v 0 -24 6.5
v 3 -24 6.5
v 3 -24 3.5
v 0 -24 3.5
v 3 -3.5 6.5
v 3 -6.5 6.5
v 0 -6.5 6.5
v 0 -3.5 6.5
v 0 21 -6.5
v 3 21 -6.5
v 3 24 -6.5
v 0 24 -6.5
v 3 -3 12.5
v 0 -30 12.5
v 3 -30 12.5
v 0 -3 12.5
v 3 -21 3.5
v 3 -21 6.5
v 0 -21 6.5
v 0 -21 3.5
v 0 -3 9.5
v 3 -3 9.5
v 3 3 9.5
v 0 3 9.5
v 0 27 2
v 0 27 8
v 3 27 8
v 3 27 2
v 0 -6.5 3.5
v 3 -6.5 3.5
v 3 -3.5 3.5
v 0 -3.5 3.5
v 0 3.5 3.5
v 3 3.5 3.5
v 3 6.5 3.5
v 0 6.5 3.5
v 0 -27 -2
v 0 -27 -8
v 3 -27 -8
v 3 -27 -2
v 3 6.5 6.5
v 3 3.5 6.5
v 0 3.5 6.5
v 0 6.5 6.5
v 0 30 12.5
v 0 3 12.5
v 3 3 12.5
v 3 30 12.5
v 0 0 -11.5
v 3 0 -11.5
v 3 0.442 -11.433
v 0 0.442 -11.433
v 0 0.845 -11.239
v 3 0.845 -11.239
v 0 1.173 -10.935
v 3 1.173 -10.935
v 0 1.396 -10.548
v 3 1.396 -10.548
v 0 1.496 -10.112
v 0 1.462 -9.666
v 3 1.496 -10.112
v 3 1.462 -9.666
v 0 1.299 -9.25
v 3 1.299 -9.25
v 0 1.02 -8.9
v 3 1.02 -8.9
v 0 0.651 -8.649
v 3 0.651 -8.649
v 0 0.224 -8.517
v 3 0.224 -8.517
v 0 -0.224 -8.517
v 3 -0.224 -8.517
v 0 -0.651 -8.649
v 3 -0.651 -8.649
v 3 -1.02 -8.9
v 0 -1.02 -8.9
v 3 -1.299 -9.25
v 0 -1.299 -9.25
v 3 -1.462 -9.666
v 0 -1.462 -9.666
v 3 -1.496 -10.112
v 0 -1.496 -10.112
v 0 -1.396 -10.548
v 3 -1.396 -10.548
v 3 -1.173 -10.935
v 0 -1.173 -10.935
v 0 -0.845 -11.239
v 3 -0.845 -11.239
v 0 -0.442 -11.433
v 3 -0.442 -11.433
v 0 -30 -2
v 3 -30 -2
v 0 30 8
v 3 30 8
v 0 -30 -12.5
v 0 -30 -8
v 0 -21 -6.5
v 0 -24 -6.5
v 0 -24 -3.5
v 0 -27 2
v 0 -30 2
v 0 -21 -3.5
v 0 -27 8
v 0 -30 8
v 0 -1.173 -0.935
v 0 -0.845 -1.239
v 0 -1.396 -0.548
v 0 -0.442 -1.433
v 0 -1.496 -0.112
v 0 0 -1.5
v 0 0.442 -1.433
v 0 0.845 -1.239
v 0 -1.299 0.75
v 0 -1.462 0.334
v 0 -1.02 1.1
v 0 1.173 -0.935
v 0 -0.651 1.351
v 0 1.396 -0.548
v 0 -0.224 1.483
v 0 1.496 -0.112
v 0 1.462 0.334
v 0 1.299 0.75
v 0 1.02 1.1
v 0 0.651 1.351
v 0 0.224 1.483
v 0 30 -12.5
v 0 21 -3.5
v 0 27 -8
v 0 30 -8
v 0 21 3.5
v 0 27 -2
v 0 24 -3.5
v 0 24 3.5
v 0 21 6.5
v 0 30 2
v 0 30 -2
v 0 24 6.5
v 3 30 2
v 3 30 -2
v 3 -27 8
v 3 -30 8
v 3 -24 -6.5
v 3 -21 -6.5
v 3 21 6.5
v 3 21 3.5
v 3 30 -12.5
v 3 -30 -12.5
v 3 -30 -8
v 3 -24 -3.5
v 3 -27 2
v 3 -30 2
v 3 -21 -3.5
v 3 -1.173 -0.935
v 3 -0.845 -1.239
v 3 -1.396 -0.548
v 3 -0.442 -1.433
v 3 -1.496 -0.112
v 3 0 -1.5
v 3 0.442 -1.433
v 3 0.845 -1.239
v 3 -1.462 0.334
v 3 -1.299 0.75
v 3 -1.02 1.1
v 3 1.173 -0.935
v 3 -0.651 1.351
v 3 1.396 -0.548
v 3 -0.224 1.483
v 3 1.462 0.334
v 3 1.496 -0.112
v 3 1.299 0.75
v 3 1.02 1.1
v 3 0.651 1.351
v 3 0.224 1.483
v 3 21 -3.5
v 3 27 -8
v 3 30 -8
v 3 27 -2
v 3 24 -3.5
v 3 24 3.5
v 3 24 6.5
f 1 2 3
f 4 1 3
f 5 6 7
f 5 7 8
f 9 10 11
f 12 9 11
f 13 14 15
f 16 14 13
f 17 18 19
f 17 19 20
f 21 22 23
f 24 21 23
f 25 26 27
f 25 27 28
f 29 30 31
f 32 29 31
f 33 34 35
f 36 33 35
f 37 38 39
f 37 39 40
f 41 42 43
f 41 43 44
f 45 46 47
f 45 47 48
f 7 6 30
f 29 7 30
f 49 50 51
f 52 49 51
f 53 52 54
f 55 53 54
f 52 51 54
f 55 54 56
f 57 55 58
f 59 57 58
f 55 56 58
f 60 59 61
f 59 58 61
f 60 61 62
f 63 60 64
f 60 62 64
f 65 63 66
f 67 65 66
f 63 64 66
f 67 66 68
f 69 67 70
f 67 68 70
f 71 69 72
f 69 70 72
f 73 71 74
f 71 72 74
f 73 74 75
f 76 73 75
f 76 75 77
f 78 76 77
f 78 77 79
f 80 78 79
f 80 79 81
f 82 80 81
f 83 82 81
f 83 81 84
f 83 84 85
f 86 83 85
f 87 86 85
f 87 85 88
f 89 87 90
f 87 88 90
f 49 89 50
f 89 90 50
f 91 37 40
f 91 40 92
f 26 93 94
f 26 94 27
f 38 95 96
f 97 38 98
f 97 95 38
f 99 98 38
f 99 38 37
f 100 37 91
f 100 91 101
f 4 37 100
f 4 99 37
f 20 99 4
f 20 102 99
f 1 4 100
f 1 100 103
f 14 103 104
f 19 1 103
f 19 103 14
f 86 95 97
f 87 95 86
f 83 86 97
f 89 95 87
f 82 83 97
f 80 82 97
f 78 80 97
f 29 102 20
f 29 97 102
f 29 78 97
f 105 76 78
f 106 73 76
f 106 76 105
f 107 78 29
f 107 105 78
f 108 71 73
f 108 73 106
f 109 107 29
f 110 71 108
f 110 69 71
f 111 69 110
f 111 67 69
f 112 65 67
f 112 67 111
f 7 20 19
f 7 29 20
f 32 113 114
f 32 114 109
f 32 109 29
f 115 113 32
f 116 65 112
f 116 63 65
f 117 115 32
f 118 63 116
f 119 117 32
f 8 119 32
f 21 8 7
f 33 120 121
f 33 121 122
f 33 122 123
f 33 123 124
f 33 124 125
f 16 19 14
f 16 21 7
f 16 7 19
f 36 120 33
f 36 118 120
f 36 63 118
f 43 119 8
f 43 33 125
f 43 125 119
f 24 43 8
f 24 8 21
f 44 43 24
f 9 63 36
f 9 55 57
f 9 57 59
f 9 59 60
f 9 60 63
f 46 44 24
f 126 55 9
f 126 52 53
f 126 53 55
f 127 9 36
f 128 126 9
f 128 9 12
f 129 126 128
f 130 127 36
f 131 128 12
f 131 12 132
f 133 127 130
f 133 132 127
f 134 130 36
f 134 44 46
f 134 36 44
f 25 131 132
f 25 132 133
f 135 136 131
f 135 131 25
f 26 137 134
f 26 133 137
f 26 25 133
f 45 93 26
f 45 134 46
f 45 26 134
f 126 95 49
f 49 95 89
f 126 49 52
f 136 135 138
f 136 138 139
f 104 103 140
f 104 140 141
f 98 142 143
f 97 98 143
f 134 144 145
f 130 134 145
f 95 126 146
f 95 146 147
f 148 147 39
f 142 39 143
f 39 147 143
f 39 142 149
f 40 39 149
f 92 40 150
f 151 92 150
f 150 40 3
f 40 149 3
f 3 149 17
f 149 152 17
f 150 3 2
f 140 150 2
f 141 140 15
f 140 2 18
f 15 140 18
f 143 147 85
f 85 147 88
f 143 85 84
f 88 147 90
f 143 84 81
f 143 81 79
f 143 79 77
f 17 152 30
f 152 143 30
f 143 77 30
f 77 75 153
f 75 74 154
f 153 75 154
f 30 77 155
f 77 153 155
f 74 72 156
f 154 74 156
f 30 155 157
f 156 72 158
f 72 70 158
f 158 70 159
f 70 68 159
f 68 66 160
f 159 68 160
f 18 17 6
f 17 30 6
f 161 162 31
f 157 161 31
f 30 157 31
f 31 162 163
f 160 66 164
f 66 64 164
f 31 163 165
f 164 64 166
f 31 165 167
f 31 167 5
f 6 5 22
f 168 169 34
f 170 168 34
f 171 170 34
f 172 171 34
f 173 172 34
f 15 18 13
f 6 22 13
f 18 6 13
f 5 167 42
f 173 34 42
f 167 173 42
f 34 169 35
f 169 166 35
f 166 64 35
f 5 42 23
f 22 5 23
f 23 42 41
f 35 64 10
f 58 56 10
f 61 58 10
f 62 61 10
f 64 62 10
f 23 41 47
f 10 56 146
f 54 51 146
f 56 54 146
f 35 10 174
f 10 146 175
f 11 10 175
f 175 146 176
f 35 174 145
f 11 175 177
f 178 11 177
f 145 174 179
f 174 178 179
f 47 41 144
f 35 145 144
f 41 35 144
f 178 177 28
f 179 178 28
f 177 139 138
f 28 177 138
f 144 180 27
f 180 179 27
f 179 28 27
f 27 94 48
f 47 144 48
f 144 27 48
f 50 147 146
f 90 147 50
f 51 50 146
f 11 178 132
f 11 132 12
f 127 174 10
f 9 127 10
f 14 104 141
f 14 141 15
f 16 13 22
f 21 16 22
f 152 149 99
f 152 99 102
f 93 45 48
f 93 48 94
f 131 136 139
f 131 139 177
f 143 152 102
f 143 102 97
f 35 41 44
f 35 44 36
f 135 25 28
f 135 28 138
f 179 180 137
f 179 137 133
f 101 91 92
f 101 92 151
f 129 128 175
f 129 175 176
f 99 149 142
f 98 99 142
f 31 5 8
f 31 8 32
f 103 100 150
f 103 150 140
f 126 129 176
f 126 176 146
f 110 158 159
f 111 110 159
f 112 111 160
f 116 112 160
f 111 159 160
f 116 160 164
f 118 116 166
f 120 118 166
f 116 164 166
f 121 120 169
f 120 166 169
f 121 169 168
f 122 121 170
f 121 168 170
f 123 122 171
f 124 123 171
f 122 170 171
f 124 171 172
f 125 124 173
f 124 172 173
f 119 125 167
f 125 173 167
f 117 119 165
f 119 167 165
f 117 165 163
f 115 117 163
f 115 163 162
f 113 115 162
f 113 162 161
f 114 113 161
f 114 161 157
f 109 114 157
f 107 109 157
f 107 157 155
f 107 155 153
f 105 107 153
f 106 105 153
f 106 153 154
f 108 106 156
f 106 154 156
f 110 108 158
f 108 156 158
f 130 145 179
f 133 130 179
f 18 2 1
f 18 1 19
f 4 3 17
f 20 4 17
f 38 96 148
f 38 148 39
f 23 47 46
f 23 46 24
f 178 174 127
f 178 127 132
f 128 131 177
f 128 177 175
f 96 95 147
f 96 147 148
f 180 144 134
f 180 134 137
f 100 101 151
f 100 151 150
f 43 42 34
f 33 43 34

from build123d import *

# Parameters (mm, degrees)
BOSS_EXTRUDE1_DEPTH = 3
SKETCH2_W           = 3
SKETCH2_H           = 3
CUT_EXTRUDE1_DEPTH  = 3
SKETCH3_R           = 1.5
CUT_EXTRUDE2_DEPTH  = 3
SKETCH4_W           = 3
SKETCH4_H           = 6
SKETCH4_H_2         = 3
CUT_EXTRUDE3_DEPTH  = 10


with BuildPart() as part:
    # Sketch1 → Boss-Extrude1 (new body)
    with BuildSketch(Plane(origin=(0, 0, 0), x_dir=(0, 0, -1), z_dir=(1, 0, 0))):
        Polygon((8, 30), (12.5, 30), (12.5, -30), (8, -30), (8, -27), (2, -27), (2, -30), (-2, -30), (-2, -27), (-8, -27), (-8, -30), (-12.5, -30), (-12.5, 30), (-8, 30), (-8, 27), (-2, 27), (-2, 30), (2, 30), (2, 27), (8, 27), align=None)
    extrude(amount=BOSS_EXTRUDE1_DEPTH)

    # Sketch2 → Cut-Extrude1 (cut)
    with BuildSketch(Plane(origin=(3, 0, 0), x_dir=(0, 0, -1), z_dir=(1, 0, 0))):
        with Locations((-5, 22.5)):
            Rectangle(SKETCH2_W, SKETCH2_H)
        with Locations((5, 22.5)):
            Rectangle(SKETCH2_W, SKETCH2_H)
        with Locations((5, -22.5)):
            Rectangle(SKETCH2_W, SKETCH2_H)
        with Locations((-5, -22.5)):
            Rectangle(SKETCH2_W, SKETCH2_H)
    extrude(amount=-CUT_EXTRUDE1_DEPTH, mode=Mode.SUBTRACT)

    # Sketch3 → Cut-Extrude2 (cut)
    with BuildSketch(Plane(origin=(3, 0, 0), x_dir=(0, 0, -1), z_dir=(1, 0, 0))):
        Circle(SKETCH3_R)
        with Locations((10, 0)):
            Circle(SKETCH3_R)
    extrude(amount=-CUT_EXTRUDE2_DEPTH, mode=Mode.SUBTRACT)

    # Sketch4 → Cut-Extrude3 (cut)
    with BuildSketch(Plane(origin=(3, 0, 0), x_dir=(0, 0, -1), z_dir=(1, 0, 0))):
        with Locations((-11, 0)):
            Rectangle(SKETCH4_W, SKETCH4_H)
        with Locations((-5, 5)):
            Rectangle(SKETCH4_W, SKETCH4_H_2)
        with Locations((-5, -5)):
            Rectangle(SKETCH4_W, SKETCH4_H_2)
    extrude(amount=-CUT_EXTRUDE3_DEPTH, mode=Mode.SUBTRACT)


solid = part.part
